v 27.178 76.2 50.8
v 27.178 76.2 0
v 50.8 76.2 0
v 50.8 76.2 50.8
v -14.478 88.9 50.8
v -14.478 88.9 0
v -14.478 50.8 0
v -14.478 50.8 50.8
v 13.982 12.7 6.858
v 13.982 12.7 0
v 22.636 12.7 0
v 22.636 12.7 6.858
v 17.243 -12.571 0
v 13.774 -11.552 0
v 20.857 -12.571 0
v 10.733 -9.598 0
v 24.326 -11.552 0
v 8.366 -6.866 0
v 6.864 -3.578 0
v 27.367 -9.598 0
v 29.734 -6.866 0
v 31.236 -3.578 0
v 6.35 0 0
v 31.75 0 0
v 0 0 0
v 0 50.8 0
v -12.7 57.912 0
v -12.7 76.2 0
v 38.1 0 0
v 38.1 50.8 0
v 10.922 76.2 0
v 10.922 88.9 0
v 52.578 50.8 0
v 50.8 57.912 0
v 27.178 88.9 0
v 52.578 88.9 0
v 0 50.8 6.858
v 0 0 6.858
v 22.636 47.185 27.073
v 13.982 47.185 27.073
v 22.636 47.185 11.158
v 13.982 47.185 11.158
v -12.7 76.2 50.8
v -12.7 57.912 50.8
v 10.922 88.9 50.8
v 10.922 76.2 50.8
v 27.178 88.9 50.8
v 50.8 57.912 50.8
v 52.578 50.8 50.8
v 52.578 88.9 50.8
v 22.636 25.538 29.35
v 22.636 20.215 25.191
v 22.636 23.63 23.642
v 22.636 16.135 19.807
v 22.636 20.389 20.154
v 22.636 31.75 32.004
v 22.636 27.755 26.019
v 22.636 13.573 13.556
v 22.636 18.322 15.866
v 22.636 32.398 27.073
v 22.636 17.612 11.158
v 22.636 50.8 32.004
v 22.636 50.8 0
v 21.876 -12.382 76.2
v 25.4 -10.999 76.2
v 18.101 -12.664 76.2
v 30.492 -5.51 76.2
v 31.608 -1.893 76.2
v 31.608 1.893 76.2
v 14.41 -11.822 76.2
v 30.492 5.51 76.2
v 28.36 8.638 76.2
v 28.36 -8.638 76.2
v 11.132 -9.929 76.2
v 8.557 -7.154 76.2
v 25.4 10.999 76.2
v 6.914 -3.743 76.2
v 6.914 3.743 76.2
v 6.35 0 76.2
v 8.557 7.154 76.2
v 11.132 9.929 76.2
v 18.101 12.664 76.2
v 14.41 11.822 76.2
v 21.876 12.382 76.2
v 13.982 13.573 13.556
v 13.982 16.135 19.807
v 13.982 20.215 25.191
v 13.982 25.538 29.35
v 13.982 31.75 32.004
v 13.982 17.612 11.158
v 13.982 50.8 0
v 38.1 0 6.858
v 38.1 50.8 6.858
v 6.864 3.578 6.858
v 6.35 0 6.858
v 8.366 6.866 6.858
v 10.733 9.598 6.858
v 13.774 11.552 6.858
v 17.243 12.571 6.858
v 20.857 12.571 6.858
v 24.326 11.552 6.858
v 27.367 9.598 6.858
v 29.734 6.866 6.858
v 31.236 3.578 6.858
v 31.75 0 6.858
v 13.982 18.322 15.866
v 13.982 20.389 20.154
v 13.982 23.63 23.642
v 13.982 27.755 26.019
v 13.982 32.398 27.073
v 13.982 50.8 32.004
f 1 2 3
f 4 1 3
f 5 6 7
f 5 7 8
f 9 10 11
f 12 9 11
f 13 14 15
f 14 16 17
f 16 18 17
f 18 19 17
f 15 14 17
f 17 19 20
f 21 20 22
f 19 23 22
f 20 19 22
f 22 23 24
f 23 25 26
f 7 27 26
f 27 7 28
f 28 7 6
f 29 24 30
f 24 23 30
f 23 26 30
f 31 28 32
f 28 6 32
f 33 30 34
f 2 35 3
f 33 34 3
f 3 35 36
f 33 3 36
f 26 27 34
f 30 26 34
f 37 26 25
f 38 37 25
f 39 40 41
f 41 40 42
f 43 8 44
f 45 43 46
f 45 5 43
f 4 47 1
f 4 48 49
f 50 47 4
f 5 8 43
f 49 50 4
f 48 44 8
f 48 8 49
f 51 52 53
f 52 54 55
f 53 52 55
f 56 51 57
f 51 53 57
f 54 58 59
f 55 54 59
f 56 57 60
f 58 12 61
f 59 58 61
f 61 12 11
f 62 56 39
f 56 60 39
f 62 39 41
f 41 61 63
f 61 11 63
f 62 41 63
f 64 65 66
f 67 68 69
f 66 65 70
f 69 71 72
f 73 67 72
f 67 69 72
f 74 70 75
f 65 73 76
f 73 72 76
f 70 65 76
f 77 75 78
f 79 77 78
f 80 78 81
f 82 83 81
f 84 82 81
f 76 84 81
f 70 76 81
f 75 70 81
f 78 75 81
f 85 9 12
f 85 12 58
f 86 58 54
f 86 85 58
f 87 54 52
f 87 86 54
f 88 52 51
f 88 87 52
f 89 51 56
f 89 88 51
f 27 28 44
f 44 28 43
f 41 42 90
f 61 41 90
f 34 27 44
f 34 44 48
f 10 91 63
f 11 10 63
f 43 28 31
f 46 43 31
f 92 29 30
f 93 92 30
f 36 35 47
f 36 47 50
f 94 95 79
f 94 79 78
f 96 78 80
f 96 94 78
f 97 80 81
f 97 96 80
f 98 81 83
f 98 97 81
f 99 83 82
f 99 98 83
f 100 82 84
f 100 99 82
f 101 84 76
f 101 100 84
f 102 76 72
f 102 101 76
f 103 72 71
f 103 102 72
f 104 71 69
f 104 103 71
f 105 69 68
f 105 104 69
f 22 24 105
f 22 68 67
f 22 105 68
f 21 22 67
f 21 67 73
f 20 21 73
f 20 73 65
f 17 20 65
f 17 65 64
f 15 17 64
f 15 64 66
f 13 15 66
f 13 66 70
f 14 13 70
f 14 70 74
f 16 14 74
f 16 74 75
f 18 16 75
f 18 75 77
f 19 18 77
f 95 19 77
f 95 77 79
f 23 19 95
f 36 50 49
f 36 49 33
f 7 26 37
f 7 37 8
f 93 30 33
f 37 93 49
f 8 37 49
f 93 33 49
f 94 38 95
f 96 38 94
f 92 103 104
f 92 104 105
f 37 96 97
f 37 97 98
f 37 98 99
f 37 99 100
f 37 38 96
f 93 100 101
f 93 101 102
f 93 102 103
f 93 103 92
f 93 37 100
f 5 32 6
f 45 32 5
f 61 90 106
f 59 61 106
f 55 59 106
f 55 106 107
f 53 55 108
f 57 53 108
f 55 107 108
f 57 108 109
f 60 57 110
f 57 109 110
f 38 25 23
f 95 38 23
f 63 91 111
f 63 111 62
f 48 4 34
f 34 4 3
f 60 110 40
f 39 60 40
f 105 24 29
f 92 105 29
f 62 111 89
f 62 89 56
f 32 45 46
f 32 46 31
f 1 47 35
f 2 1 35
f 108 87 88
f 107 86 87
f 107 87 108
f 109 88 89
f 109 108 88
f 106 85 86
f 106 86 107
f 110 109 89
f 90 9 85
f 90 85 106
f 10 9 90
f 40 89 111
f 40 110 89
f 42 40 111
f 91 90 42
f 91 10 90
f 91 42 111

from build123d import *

# Parameters (mm, degrees)
BOSS_EXTRUDE4_DEPTH  = 6.858
SKETCH7_R            = 12.7
BOSS_EXTRUDE5_DEPTH  = 76.2
SKETCH9_W            = 63.5
SKETCH9_H            = 50.8
BOSS_EXTRUDE6_DEPTH  = 7.112
SKETCH11_W           = 50.8
SKETCH11_H           = 38.1
BOSS_EXTRUDE7_DEPTH  = 1.778
SKETCH12_W           = 50.8
SKETCH12_H           = 38.1
BOSS_EXTRUDE8_DEPTH  = 1.778
SKETCH14_W           = 25.4
SKETCH14_H           = 50.8
BOSS_EXTRUDE9_DEPTH  = 12.7
SKETCH15_W           = 25.4
SKETCH15_H           = 50.8
BOSS_EXTRUDE10_DEPTH = 12.7
SKETCH19_W           = 8.653186955
SKETCH19_H           = 38.1
BOSS_EXTRUDE11_DEPTH = 32.004
CUT_EXTRUDE4_DEPTH   = 8.653187
CUT_EXTRUDE5_DEPTH   = 8.653187


with BuildPart() as part:
    # Sketch3 → Boss-Extrude4 (new body)
    with BuildSketch(Plane.XY):
        with BuildLine():
            Line((0, 0), (6.35, 0))
            ThreePointArc((6.35, 0), (19.05, 12.7), (31.75, 0))
            Line((31.75, 0), (38.1, 0))
            Line((38.1, 0), (38.1, 50.8))
            Line((38.1, 50.8), (0, 50.8))
            Line((0, 50.8), (0, 0))
        make_face()
    extrude(amount=BOSS_EXTRUDE4_DEPTH)

    # Sketch7 → Boss-Extrude5 (add)
    with BuildSketch(Plane(origin=(0, 0, 0), x_dir=(-1, 0, 0), z_dir=(0, 0, -1))):
        with Locations((-19.05, 0)):
            Circle(SKETCH7_R)
    extrude(amount=-BOSS_EXTRUDE5_DEPTH)

    # Sketch9 → Boss-Extrude6 (add)
    with BuildSketch(Plane(origin=(0, 50.8, 0), x_dir=(1, 0, 0), z_dir=(0, 1, 0))):
        with Locations((19.05, -25.4)):
            Rectangle(SKETCH9_W, SKETCH9_H)
    extrude(amount=BOSS_EXTRUDE6_DEPTH)

    # Sketch11 → Boss-Extrude7 (add)
    with BuildSketch(Plane(origin=(50.8, 0, 0), x_dir=(0, 0, -1), z_dir=(1, 0, 0))):
        with Locations((-25.4, 69.85)):
            Rectangle(SKETCH11_W, SKETCH11_H)
    extrude(amount=BOSS_EXTRUDE7_DEPTH)

    # Sketch12 → Boss-Extrude8 (add)
    with BuildSketch(Plane.ZY.offset(12.7)):
        with Locations((25.4, 69.85)):
            Rectangle(SKETCH12_W, SKETCH12_H)
    extrude(amount=BOSS_EXTRUDE8_DEPTH)

    # Sketch14 → Boss-Extrude9 (add)
    with BuildSketch(Plane(origin=(0, 88.9, 0), x_dir=(1, 0, 0), z_dir=(0, 1, 0))):
        with Locations((39.878, -25.4)):
            Rectangle(SKETCH14_W, SKETCH14_H)
    extrude(amount=-BOSS_EXTRUDE9_DEPTH)

    # Sketch15 → Boss-Extrude10 (add)
    with BuildSketch(Plane(origin=(0, 88.9, 0), x_dir=(1, 0, 0), z_dir=(0, 1, 0))):
        with Locations((-1.778, -25.4)):
            Rectangle(SKETCH15_W, SKETCH15_H)
    extrude(amount=-BOSS_EXTRUDE10_DEPTH)


with BuildPart() as body_2:
    # Sketch19 → Boss-Extrude11 (new body)
    with BuildSketch(Plane.XY):
        with Locations((18.309081845, 31.75)):
            Rectangle(SKETCH19_W, SKETCH19_H)
    extrude(amount=BOSS_EXTRUDE11_DEPTH)

    # Sketch26 → Cut-Extrude4 (cut)
    with BuildSketch(Plane.ZY.offset(-13.982488368)):
        with BuildLine():
            Line((32.004, 31.75), (32.004, 12.7))
            Line((32.004, 12.7), (6.858, 12.7))
            ThreePointArc((6.858, 12.7), (22.631584057, 18.000229045), (32.004, 31.75))
        make_face()
    extrude(amount=-CUT_EXTRUDE4_DEPTH, mode=Mode.SUBTRACT)

    # Sketch28 → Cut-Extrude5 (cut)
    with BuildSketch(Plane.ZY.offset(-13.982488368)):
        with BuildLine():
            Line((11.158058449, 47.185073314), (11.158058449, 17.611593285))
            ThreePointArc((11.158058449, 17.611593285), (22.019922173, 21.878833952), (27.072600667, 32.3983333))
            Line((27.072600667, 32.3983333), (27.072600667, 47.185073314))
            Line((27.072600667, 47.185073314), (11.158058449, 47.185073314))
        make_face()
    extrude(amount=-CUT_EXTRUDE5_DEPTH, mode=Mode.SUBTRACT)


solid = Compound([part.part, body_2.part])
